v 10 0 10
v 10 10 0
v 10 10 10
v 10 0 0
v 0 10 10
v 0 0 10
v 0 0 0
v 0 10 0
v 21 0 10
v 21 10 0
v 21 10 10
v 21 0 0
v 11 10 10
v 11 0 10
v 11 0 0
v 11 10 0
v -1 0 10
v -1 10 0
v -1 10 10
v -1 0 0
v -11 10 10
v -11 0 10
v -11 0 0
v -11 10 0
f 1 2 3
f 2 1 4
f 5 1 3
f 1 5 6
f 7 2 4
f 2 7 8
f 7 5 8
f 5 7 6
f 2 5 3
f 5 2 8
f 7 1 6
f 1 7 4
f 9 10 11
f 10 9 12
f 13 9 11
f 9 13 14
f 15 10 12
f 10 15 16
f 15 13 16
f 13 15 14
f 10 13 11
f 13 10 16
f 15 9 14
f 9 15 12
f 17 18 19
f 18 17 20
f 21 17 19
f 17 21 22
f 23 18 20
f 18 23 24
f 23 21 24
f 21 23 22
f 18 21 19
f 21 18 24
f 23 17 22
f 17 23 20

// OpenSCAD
cube(10);

translate([11, 0, 0]) cube(10);

translate(-[11, 0, 0]) cube(10);
